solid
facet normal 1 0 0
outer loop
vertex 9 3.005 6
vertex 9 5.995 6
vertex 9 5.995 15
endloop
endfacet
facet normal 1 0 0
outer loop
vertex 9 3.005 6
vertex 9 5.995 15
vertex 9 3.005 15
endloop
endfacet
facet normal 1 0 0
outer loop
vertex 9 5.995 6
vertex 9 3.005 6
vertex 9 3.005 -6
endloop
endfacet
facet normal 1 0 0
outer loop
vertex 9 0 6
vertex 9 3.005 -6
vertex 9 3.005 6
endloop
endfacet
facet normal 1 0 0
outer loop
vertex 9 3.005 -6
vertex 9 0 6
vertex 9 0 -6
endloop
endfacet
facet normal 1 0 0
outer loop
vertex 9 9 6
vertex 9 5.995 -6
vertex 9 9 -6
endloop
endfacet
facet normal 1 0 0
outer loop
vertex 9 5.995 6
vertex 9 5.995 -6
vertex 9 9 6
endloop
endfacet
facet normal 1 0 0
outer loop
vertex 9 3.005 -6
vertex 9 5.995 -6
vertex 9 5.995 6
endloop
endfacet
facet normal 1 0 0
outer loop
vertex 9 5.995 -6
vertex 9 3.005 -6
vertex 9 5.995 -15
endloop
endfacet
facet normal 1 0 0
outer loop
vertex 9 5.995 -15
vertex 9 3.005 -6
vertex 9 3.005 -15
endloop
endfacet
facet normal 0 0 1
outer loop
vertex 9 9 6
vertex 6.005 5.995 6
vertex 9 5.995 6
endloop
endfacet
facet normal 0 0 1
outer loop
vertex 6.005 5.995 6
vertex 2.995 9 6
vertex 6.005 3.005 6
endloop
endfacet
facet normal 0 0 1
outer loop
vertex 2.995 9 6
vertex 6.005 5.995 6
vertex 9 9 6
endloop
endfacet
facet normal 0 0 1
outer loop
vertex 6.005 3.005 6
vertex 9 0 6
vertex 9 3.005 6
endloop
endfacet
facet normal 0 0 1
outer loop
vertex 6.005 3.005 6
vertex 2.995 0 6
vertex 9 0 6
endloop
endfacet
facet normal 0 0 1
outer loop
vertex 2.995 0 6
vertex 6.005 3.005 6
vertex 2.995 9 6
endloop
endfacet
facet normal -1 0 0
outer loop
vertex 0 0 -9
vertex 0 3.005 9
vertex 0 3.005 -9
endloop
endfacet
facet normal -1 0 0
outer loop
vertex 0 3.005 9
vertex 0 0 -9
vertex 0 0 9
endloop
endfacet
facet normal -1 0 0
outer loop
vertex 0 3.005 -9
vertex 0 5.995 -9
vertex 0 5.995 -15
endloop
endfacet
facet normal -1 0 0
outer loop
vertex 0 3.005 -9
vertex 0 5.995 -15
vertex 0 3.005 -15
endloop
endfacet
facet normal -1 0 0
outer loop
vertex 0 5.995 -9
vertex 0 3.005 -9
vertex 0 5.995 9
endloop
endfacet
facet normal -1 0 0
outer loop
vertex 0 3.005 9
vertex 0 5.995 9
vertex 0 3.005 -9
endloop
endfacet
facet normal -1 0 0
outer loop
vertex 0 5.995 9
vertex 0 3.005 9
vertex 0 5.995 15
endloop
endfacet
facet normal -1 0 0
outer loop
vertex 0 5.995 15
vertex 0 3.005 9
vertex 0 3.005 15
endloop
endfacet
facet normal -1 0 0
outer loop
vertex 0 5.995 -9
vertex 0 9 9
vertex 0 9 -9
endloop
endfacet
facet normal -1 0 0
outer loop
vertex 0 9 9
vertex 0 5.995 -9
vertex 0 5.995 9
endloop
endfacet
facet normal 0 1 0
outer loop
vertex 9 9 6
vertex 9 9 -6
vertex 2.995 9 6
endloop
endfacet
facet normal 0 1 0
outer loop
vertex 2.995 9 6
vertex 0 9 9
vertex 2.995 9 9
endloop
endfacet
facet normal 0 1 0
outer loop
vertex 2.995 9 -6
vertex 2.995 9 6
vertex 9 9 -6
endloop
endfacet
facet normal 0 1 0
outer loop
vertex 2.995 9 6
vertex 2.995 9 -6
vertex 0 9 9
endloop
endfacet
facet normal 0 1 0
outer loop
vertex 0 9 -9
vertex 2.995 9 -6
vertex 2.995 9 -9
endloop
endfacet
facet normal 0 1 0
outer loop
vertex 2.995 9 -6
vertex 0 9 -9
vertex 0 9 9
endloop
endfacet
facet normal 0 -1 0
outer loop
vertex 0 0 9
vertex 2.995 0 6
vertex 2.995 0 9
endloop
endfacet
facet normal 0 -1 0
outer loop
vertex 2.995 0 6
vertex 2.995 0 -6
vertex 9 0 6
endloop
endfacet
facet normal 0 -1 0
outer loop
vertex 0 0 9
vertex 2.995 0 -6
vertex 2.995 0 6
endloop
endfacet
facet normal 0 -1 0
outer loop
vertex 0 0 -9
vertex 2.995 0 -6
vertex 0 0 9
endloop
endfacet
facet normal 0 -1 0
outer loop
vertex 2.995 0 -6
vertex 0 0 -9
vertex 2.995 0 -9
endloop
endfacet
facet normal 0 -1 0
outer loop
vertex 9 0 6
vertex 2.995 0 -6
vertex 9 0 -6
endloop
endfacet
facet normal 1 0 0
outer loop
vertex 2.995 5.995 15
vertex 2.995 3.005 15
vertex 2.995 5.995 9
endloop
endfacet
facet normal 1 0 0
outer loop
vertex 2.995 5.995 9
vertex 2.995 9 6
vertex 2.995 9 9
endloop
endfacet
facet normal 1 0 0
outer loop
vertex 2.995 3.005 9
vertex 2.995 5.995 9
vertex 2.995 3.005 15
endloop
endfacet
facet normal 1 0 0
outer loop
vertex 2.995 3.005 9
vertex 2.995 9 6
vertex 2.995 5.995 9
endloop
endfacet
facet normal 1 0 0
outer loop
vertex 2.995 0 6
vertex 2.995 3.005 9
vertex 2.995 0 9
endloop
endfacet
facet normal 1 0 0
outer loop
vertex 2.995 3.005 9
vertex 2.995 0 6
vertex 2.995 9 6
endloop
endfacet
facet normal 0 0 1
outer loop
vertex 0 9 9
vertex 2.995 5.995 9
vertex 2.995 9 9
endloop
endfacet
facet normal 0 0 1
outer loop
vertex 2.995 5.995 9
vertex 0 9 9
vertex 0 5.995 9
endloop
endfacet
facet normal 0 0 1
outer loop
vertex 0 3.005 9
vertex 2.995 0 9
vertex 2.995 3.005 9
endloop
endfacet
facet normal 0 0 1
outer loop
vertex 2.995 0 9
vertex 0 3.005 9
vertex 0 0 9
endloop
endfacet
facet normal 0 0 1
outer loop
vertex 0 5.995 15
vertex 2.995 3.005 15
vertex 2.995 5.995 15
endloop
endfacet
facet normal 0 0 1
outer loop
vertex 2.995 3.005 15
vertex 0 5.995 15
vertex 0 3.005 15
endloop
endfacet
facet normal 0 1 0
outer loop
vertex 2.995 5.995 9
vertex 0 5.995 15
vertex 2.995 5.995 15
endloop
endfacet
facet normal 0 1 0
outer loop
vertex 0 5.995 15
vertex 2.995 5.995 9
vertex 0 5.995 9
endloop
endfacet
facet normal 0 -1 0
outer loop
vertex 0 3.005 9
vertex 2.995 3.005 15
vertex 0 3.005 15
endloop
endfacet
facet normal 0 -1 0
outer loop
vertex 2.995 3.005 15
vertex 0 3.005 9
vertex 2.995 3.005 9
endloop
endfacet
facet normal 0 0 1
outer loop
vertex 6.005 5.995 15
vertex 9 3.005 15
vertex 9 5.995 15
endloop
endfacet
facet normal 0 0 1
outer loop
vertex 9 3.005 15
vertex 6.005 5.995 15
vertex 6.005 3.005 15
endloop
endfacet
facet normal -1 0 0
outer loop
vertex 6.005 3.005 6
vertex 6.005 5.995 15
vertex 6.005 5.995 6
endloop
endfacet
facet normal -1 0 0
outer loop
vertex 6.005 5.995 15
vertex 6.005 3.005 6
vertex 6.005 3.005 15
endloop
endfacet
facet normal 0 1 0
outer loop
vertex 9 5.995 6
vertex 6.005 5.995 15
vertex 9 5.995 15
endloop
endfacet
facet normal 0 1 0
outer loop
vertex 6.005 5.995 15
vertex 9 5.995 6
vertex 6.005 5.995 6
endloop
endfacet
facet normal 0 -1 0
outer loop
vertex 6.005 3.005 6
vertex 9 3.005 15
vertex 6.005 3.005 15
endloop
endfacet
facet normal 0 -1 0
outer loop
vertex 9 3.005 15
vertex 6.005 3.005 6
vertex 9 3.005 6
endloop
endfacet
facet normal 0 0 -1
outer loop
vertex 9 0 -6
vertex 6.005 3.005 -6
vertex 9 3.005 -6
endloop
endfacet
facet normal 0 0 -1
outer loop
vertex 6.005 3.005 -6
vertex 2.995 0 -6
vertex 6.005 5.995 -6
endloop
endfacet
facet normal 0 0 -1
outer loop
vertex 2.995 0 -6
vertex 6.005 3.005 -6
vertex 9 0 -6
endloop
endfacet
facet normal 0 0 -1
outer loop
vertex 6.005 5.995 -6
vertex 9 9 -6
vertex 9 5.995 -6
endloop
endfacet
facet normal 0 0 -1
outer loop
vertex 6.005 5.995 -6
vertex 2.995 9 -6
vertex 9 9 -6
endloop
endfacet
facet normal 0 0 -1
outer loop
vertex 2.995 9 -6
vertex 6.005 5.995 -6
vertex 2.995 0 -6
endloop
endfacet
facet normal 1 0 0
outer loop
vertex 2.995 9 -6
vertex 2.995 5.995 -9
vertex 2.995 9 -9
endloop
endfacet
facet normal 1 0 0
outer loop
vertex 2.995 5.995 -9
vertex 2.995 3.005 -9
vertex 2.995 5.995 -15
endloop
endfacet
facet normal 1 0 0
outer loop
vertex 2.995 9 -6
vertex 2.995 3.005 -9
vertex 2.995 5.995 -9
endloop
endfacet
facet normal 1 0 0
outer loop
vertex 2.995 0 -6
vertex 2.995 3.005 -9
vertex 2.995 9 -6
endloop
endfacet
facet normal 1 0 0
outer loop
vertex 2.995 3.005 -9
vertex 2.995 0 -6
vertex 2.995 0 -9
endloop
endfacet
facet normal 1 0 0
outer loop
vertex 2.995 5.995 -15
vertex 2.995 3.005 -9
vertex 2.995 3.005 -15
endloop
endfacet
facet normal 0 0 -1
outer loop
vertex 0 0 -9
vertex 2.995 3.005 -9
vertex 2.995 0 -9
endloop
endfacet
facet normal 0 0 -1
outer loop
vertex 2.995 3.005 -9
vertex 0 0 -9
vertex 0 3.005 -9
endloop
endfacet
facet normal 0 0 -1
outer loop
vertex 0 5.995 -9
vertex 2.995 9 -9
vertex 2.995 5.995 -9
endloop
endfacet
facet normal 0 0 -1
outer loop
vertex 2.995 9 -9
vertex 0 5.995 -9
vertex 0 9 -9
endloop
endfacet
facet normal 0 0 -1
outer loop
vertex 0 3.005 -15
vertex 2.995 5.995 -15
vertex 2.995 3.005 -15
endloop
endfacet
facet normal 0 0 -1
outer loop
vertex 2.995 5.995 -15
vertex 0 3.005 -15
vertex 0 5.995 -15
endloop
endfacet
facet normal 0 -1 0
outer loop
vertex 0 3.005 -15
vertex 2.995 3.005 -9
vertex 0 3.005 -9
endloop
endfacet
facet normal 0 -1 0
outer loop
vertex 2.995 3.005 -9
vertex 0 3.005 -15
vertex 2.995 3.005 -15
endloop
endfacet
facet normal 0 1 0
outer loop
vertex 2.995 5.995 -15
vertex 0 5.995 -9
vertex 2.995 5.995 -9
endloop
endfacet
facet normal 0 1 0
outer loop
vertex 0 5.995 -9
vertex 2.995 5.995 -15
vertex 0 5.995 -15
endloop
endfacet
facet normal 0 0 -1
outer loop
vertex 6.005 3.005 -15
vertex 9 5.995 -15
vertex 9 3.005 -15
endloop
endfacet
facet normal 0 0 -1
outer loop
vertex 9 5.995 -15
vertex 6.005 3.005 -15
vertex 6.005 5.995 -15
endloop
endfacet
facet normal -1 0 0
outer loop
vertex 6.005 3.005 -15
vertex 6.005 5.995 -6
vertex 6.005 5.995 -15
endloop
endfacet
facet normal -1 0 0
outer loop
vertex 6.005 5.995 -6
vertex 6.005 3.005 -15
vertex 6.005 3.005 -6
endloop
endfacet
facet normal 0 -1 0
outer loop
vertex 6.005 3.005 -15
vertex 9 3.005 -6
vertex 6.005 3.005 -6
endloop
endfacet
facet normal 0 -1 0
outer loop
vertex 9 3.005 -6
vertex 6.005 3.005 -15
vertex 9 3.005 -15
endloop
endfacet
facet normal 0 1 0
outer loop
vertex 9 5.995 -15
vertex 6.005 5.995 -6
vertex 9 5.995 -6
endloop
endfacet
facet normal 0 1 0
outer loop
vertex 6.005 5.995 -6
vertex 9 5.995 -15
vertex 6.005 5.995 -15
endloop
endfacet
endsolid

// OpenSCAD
//this is the user inputed width of the square shaft
width=9;
//this is the user inputed height of the solid shaft (not including the joint)
height=12;
//this is the user inputed tolerance. may be printer specific. incorporating about 0.01" gap works well on my Makerbot Replicator
tolerance=0.01;

module joint(width, height){
    cube([width, width, height]);
    translate([0,0,height]){cube([width/3-tolerance/2,width, width/3]);}
    translate([0,width/3+tolerance/2,height+width/3]){
        cube([width/3-tolerance/2,width/3-tolerance,2*width/3]);}
    translate([2*width/3+tolerance/2,width/3+tolerance/2,height]){
        cube([width/3-tolerance/2,width/3-tolerance,width]);}

}

module piece1(width, height1){
    joint(width,height1);
}

piece1(width,height/2);
rotate(v=[1,0,0],a=180){
    translate([0,-width,0]){
    piece1(width,height/2);
}}
